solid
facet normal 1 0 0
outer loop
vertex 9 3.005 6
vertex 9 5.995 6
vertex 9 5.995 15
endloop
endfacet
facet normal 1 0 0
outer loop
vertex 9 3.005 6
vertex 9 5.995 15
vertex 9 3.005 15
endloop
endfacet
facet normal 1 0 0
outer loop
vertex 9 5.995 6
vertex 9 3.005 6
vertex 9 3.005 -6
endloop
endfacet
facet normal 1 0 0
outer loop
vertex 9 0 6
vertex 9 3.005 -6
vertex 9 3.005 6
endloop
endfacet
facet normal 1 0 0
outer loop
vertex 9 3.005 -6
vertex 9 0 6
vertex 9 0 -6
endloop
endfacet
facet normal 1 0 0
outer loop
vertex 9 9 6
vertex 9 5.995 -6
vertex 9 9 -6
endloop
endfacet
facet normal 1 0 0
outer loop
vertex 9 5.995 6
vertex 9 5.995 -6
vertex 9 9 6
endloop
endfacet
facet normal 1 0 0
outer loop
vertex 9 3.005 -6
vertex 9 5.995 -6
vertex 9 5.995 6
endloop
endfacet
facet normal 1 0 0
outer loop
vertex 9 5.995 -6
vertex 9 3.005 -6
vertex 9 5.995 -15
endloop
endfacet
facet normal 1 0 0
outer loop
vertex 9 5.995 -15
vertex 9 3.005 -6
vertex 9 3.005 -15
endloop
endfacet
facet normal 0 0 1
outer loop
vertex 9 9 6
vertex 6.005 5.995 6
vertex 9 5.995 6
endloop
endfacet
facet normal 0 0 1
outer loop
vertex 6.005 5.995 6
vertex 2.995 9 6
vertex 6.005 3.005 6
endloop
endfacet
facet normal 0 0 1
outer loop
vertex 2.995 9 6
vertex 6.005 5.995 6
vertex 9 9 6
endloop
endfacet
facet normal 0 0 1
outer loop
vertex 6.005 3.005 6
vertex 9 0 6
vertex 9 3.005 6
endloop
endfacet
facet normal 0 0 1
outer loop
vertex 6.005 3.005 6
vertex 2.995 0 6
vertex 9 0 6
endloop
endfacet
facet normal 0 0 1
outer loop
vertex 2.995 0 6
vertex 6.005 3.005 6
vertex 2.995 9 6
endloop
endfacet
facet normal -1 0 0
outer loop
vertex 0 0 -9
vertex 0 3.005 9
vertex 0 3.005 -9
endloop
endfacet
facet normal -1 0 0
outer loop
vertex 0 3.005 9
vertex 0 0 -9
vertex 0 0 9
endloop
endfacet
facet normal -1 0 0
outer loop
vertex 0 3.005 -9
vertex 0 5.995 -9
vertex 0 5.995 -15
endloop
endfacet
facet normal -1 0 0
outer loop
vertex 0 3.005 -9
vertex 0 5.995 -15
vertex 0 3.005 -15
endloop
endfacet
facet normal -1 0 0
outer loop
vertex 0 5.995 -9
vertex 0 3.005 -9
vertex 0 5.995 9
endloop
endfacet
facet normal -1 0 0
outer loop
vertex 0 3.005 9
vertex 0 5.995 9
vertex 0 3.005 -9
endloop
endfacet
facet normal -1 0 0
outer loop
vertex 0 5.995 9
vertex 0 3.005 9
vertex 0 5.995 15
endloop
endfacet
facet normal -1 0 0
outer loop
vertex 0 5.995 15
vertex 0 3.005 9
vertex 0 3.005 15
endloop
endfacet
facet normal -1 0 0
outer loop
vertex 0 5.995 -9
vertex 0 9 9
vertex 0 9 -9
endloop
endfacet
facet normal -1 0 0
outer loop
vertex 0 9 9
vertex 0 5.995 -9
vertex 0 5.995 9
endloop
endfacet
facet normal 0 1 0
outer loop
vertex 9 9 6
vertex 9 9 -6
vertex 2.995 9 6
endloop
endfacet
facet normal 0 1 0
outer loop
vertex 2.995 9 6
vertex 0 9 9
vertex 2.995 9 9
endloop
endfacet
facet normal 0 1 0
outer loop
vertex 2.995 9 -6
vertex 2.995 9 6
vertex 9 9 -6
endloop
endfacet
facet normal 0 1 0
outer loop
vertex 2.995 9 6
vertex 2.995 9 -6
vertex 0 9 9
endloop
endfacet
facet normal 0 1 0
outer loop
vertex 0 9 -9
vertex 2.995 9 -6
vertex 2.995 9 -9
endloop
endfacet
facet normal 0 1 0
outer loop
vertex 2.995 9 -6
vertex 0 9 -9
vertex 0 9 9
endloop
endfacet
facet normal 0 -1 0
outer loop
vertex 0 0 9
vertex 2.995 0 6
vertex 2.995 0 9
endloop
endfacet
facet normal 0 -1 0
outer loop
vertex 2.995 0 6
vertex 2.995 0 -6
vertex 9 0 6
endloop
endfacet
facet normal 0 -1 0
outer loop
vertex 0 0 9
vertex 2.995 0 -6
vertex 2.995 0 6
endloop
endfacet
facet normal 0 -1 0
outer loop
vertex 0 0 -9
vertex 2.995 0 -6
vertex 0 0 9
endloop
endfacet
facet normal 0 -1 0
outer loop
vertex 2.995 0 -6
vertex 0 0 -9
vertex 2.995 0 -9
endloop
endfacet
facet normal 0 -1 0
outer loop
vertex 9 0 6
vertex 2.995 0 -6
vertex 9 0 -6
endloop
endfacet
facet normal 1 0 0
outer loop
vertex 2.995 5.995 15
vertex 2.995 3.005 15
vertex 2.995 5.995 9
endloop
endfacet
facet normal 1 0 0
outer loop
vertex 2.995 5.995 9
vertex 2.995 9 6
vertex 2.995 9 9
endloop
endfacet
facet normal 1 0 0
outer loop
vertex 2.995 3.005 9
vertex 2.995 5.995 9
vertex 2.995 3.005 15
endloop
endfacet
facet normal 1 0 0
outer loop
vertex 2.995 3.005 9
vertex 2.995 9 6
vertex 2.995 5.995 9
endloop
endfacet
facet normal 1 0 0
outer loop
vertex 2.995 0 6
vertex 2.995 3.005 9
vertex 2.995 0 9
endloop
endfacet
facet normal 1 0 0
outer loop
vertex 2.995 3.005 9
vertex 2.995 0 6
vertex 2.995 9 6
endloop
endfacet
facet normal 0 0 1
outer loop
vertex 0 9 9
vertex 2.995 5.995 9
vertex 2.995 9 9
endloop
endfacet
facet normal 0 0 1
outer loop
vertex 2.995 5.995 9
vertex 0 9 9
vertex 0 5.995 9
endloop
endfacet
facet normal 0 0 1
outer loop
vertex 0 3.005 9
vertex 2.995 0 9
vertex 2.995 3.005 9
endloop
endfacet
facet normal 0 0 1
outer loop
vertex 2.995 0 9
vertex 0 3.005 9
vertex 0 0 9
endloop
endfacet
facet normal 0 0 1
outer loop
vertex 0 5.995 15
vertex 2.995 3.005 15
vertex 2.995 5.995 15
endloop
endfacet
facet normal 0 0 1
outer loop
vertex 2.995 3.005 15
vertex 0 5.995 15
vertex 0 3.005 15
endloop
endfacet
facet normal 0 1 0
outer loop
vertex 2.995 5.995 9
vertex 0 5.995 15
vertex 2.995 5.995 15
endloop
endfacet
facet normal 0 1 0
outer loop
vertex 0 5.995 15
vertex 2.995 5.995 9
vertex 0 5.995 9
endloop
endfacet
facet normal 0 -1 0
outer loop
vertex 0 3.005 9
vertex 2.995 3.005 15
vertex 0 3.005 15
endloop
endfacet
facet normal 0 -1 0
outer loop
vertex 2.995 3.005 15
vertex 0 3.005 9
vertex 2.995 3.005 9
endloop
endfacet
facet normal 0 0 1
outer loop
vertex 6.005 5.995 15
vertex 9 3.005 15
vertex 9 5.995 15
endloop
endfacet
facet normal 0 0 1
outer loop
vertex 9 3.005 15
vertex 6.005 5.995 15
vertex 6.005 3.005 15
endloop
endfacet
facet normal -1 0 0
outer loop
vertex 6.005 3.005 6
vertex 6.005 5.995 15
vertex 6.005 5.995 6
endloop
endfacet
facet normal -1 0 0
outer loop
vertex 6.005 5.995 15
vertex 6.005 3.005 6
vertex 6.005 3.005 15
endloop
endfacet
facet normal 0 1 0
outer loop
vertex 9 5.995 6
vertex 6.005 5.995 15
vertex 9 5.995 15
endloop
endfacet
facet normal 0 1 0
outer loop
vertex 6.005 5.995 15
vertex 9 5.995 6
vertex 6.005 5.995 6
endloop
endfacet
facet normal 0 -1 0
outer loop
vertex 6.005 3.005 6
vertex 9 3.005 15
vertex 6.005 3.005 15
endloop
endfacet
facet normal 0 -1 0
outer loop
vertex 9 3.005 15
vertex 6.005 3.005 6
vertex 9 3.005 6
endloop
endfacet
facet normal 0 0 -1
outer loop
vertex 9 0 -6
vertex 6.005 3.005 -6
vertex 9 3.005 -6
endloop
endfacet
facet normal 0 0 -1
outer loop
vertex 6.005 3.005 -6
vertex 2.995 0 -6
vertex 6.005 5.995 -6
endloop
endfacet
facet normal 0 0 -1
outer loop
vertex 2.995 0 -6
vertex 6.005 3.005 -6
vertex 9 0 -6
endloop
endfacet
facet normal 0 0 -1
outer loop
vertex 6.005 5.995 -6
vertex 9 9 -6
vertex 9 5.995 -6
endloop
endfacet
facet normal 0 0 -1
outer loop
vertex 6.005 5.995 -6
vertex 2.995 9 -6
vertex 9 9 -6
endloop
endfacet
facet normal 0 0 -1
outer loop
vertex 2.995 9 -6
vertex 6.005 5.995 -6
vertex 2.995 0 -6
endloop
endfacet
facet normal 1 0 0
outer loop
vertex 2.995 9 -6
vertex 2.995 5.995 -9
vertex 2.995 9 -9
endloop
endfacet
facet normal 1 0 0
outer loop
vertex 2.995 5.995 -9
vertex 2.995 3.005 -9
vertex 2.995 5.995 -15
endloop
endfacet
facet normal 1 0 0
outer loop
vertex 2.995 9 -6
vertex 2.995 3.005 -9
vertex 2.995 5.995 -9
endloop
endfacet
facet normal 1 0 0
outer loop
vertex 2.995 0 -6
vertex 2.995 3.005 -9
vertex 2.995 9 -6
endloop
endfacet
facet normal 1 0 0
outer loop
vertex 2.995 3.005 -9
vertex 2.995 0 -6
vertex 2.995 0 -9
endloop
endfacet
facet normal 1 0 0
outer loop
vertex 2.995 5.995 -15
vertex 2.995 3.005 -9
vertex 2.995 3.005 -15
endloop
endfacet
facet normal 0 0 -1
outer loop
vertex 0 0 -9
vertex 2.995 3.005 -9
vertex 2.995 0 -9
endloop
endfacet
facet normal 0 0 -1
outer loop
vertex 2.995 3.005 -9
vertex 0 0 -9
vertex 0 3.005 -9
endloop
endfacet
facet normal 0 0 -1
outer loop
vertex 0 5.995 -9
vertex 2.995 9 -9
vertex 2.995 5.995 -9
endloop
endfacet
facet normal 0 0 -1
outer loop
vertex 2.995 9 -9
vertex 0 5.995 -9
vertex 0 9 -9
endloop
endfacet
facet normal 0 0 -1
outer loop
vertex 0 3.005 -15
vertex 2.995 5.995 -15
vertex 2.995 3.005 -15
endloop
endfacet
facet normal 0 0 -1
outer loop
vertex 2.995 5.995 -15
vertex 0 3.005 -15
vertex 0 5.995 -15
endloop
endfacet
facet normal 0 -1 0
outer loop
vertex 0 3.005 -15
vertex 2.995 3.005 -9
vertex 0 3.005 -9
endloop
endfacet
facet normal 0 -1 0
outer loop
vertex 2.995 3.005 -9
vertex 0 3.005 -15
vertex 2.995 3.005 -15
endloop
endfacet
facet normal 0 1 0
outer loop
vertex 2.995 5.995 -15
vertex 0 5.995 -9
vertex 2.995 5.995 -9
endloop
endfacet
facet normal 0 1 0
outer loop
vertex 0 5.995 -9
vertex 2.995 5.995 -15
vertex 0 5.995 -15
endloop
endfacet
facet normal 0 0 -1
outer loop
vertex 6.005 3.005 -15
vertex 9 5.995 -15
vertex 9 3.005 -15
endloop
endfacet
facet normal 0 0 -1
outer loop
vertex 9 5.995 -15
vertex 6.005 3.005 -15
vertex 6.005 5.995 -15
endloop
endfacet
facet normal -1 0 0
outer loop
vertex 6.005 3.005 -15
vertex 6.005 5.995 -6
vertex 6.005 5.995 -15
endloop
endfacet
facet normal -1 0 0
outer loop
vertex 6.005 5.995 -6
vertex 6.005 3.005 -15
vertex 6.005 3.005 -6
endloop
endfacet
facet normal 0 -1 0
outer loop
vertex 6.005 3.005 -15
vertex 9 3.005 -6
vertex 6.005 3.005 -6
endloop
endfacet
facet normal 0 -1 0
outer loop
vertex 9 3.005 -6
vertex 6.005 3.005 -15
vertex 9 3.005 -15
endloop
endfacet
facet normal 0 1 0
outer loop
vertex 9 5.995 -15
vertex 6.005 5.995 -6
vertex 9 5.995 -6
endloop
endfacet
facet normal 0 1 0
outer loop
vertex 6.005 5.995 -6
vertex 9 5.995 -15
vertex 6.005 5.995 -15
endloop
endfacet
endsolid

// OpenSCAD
//this is the user inputed width of the square shaft
width=9;
//this is the user inputed height of the solid shaft (not including the joint)
height=12;
//this is the user inputed tolerance. may be printer specific. incorporating about 0.01" gap works well on my Makerbot Replicator
tolerance=0.01;

module joint(width, height){
    cube([width, width, height]);
    translate([0,0,height]){cube([width/3-tolerance/2,width, width/3]);}
    translate([0,width/3+tolerance/2,height+width/3]){
        cube([width/3-tolerance/2,width/3-tolerance,2*width/3]);}
    translate([2*width/3+tolerance/2,width/3+tolerance/2,height]){
        cube([width/3-tolerance/2,width/3-tolerance,width]);}

}

module piece1(width, height1){
    joint(width,height1);
}

piece1(width,height/2);
rotate(v=[1,0,0],a=180){
    translate([0,-width,0]){
    piece1(width,height/2);
}}
